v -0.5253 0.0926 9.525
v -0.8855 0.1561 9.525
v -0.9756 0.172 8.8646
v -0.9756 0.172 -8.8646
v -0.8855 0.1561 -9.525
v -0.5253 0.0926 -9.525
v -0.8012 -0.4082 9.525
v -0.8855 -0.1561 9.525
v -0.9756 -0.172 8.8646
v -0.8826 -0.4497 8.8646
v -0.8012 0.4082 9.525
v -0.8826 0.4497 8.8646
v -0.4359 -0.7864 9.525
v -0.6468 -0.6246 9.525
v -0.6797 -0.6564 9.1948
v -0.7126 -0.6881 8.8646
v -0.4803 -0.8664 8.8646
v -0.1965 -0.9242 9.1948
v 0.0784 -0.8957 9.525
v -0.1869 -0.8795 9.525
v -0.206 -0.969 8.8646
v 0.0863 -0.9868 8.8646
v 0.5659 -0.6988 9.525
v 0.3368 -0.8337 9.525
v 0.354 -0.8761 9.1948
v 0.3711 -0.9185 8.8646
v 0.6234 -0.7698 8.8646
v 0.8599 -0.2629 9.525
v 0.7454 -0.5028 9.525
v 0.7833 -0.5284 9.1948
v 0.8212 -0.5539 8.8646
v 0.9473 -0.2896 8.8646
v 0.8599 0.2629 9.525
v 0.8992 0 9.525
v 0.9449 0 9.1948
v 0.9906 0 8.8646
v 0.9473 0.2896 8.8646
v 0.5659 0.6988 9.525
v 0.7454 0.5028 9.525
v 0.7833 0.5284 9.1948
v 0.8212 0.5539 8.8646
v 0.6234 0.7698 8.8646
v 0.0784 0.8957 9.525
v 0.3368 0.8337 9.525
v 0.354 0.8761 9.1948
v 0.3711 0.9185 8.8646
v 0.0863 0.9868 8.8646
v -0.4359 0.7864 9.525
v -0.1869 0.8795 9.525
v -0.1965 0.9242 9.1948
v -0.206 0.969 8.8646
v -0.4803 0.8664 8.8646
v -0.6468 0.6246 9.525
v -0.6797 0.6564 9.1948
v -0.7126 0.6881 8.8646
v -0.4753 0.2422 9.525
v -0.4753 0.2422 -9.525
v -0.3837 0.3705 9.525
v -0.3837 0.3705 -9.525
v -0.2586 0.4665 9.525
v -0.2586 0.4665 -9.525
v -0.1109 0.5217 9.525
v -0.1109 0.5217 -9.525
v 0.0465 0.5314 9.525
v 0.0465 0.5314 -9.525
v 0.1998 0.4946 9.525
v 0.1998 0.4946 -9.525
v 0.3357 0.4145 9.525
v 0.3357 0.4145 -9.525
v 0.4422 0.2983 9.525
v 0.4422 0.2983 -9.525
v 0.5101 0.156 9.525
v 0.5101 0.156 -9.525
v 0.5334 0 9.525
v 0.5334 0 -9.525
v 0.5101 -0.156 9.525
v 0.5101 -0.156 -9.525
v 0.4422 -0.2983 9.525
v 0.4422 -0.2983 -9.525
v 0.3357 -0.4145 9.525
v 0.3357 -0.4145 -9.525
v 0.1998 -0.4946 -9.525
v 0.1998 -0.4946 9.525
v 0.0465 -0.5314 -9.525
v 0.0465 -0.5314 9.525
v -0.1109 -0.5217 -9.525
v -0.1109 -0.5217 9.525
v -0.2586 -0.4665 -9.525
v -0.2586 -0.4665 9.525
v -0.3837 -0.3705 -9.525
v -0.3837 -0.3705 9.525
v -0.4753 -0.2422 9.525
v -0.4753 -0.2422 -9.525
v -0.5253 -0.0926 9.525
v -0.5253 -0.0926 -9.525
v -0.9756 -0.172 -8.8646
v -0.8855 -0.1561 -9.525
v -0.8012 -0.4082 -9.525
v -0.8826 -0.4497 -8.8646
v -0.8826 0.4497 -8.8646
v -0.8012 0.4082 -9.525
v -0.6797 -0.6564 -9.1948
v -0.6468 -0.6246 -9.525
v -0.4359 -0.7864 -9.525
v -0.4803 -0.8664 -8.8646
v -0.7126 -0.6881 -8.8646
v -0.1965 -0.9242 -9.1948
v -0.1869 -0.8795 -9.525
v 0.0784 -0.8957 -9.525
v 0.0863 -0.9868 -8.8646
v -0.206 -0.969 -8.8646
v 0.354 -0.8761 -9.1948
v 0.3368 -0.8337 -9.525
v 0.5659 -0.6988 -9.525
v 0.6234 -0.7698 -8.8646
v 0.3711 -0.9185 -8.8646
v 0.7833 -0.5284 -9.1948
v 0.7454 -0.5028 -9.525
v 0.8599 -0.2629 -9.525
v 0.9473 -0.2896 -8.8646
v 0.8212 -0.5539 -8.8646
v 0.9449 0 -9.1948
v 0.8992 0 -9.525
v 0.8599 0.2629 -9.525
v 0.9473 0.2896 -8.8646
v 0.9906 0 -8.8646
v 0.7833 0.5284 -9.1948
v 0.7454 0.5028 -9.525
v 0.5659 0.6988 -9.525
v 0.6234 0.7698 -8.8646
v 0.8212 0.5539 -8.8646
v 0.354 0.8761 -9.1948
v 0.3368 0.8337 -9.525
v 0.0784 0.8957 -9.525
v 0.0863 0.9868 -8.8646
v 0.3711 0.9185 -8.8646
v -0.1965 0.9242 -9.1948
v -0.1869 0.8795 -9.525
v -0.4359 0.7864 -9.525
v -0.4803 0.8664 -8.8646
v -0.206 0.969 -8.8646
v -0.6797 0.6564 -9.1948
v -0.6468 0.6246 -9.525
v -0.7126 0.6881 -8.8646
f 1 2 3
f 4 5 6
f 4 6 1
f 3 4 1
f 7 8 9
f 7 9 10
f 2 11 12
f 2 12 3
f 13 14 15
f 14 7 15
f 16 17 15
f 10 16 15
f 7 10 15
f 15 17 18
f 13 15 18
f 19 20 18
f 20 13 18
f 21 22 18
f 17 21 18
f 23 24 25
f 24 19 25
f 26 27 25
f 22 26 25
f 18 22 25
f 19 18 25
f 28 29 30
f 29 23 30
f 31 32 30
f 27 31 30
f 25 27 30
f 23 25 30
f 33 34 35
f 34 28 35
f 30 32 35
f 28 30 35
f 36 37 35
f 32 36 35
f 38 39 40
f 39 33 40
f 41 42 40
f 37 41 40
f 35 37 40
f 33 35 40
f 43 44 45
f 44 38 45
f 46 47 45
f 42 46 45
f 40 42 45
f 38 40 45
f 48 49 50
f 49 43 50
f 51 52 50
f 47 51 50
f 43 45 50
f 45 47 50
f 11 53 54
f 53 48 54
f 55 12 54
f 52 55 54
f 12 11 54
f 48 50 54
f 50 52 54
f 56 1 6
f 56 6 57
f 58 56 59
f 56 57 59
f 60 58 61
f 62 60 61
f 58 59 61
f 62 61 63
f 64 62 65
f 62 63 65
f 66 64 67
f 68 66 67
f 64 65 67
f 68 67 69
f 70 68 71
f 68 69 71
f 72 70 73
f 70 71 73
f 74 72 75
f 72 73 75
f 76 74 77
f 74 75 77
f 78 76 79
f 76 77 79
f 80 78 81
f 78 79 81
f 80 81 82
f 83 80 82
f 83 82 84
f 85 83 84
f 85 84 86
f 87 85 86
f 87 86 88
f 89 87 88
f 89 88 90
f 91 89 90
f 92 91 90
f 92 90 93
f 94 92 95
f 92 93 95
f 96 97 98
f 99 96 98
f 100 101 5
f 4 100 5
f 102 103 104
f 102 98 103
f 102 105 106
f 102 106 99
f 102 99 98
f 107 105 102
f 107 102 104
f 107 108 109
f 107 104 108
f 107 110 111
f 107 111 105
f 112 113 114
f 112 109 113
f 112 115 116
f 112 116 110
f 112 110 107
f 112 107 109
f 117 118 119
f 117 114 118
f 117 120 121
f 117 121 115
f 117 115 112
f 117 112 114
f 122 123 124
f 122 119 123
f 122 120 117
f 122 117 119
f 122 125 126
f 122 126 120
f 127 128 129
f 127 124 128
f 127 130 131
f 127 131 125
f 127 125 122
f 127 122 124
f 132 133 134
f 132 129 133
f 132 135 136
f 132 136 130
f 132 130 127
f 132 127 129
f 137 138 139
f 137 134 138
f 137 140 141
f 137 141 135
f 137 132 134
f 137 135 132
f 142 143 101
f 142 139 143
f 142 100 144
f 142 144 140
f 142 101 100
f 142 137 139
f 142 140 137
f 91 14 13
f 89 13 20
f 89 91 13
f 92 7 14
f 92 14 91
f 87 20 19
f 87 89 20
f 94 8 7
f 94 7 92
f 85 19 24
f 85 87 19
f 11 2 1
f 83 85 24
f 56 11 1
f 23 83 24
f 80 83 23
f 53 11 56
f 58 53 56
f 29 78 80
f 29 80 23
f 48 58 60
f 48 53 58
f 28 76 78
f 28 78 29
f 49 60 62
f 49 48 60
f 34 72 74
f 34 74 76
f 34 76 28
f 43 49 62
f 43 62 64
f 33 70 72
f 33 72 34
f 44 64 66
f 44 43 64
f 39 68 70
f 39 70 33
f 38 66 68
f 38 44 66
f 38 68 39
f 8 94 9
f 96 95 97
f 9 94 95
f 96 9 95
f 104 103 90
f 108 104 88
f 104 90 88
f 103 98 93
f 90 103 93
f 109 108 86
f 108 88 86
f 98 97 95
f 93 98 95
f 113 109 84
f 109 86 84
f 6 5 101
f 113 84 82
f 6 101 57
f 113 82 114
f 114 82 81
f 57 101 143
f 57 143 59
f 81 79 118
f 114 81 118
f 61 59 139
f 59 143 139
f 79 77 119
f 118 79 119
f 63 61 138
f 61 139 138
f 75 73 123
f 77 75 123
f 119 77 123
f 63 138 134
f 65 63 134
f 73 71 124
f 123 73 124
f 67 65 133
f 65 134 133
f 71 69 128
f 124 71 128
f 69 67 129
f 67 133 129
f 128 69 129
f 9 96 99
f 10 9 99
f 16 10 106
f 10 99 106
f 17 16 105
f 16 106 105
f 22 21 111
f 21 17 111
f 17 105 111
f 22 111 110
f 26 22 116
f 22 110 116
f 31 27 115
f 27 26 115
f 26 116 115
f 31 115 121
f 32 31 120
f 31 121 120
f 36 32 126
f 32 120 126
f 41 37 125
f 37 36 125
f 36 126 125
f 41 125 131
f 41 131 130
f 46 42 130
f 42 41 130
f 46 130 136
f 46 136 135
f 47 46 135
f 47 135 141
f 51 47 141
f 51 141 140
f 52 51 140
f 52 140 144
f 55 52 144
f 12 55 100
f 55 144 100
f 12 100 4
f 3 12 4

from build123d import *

# Parameters (mm, degrees)
EXTRUDE1_DEPTH      = 9.525
EXTRUDE1_DEPTH_BACK = 9.525


with BuildPart() as part:
    # Sketch1 → Extrude1 (new, two sides: drawn at the far end of the back side and taken through both)
    with BuildSketch(Plane.XY.offset(-EXTRUDE1_DEPTH_BACK)):
        with BuildLine():
            Line((-0.525296455, -0.092623938), (-0.97555056, -0.172015885))
            ThreePointArc((-0.97555056, -0.172015885), (0.9906, 0), (-0.97555056, 0.172015885))
            Line((-0.97555056, 0.172015885), (-0.525296455, 0.092623938))
            ThreePointArc((-0.525296455, 0.092623938), (0.5334, 0), (-0.525296455, -0.092623938))
        make_face()
    extrude(amount=EXTRUDE1_DEPTH + EXTRUDE1_DEPTH_BACK)

    # Sketch2 → Cut-Revolve1 (revolve, cut)
    with BuildSketch(Plane(origin=(0, 0, 0), x_dir=(0, 0, -1), z_dir=(1, 0, 0))):
        Polygon((9.525, 0.89916), (8.8646, 0.9906), (9.525, 0.9906), align=None)
    cut_revolve1 = revolve(axis=Axis((0, 0, -9.525), (0, 0, 1)), mode=Mode.SUBTRACT)

    # Mirror1: Cut-Revolve1 across plane
    add(cut_revolve1.mirror(Plane.XY), mode=Mode.SUBTRACT)


solid = part.part
